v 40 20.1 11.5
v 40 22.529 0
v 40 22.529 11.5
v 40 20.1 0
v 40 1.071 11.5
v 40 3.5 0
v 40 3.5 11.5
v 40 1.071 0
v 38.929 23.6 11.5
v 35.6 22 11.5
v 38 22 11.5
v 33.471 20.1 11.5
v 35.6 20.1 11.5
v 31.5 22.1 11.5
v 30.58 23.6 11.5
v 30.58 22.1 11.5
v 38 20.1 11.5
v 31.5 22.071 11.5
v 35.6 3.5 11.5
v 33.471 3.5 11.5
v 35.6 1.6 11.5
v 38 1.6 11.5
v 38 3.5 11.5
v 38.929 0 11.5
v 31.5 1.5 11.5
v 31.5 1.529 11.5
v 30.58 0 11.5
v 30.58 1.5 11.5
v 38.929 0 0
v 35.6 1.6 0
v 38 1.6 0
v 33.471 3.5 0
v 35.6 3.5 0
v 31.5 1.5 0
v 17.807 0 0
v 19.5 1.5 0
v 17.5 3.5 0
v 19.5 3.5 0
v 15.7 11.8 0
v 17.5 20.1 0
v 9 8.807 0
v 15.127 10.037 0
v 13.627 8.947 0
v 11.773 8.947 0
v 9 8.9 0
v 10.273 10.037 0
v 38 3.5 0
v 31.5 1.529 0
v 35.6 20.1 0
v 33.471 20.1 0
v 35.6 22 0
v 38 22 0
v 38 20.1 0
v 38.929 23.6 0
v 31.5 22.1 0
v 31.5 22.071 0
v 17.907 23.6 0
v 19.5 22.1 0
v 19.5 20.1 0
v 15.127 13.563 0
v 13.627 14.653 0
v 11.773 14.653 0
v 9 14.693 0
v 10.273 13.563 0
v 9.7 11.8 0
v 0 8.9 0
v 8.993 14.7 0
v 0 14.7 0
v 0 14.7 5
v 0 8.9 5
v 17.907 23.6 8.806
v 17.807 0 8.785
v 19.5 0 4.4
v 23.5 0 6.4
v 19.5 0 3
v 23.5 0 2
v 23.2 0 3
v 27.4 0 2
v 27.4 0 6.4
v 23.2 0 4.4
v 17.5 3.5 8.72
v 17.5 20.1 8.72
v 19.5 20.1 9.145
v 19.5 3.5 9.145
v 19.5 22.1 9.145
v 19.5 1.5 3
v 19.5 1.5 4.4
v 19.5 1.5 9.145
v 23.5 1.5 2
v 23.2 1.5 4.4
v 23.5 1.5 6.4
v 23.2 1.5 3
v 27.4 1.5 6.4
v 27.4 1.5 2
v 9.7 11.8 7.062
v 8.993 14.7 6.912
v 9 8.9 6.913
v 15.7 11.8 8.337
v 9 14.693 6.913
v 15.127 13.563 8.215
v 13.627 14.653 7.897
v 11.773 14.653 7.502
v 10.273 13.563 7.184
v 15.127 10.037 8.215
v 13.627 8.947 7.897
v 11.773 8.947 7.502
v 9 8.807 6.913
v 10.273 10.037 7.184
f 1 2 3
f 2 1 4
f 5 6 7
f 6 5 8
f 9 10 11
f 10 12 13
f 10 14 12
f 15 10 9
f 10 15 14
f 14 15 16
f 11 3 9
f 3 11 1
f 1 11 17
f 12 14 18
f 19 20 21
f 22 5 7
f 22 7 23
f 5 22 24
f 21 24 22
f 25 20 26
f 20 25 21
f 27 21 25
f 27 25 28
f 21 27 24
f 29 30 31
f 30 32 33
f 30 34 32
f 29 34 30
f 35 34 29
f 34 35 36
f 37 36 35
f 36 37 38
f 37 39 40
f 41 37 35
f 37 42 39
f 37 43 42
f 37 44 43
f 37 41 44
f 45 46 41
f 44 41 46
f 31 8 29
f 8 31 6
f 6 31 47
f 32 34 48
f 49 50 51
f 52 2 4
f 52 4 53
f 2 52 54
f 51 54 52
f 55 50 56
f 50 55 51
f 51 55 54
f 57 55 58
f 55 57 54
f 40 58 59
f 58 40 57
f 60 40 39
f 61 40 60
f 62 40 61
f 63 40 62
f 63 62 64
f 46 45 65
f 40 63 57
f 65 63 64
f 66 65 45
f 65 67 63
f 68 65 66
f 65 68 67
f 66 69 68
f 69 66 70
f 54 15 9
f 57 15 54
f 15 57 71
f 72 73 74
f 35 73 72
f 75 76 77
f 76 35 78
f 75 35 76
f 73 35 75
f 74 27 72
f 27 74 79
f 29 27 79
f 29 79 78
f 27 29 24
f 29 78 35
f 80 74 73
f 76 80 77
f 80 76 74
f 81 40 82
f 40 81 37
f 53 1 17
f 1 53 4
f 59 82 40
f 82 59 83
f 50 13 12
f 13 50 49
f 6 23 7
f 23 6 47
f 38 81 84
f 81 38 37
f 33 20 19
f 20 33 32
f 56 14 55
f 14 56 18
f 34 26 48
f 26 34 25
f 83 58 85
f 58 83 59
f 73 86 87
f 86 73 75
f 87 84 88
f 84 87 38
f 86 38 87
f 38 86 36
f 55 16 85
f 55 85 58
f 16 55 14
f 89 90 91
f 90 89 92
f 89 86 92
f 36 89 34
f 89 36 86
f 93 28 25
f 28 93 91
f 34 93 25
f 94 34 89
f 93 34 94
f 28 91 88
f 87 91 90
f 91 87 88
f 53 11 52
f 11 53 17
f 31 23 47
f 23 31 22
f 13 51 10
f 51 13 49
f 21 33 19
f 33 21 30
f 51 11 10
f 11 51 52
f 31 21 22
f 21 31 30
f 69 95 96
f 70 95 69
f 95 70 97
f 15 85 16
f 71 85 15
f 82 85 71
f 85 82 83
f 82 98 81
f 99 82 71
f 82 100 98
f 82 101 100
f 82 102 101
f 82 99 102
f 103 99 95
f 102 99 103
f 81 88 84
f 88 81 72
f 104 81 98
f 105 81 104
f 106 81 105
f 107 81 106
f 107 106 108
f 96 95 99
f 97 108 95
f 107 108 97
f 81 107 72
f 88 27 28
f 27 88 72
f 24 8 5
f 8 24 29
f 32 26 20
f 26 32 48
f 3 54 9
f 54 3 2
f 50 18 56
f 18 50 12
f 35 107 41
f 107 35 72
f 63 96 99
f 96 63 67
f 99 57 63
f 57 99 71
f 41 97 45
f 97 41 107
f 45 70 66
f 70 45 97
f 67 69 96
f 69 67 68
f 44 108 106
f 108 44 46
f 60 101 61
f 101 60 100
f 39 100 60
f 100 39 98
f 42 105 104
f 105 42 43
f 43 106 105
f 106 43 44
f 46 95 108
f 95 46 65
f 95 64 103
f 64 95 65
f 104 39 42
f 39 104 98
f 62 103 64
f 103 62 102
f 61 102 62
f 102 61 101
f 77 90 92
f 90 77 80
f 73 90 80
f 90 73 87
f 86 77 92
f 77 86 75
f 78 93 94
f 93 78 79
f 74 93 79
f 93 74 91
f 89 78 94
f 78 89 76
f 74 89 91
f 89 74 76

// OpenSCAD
use <MCAD/involute_gears.scad>

module cutout() {
	difference() {
		rotate([45,0,0]) cube([33,9,9]);
		translate([-0.5,-6,11]) cube([34,10,10]);
		translate([-0.5,6.3,0]) cube([34,10,10]);
		translate([-0.5,-16.3,0]) cube([34,10,10]);
	}
}

module cageUp(withServo) {
	difference() {
		union() {
			translate([-12.5,-8,0]) cube([25,16,17.2]);
			difference() {
				translate([-16.1,-8,10]) cube([32.2,16,7.2]);
				translate([11,-8.25,11]) rotate([0,45,0]) cube([30, 16.5, 30]);		
				translate([-11,-8.25,11]) rotate([0,-135,0]) cube([10, 16.5, 10]);
			}
		}
		translate([-11.75,-6.3,1]) cube([23.5,12.6,16.3]);
		translate([-13,-6.3,3]) cube([26,12.6,7]);
		translate([-16.5,0,3.65]) cutout();
		translate([-10,-8.1,1]) cube([20,16.2,10]);
		translate([-5,-8.1,1]) cube([10,16.2,14.7]);
		translate([-3.7,-10,4.65]) rotate([0, 0, 90]) cutout();
		translate([3.7,-10,4.65]) rotate([0, 0, 90]) cutout();
		translate([13.75,0,14.3]) cylinder(r=1,h=3,$fn=45);
		translate([-13.75,0,14.3]) cylinder(r=1,h=3,$fn=45);
	}
	if (withServo) {
		translate([11.5,6.3,1]) rotate([0,0,180]) servo();
	}
}

module cageSide(withServo, mount) {
	difference() {
		rotate([-90,0,0]) union() {
			translate([-13.5,-8,0]) cube([27,16,17.2]);
			translate([-16.1,-8,12.2]) cube([32.2,16,5]);
		}
		rotate([-90,0,0]) translate([-11.75,-6.3,1]) cube([23.5,12.6,16.3]);
		rotate([-90,0,0]) translate([11,-12,3.5]) cube([3,15,4]);
		rotate([-90,0,0]) translate([13.75,0,10.3]) cylinder(r=1,h=8,$fn=45);
		rotate([-90,0,0]) translate([-13.75,0,10.3]) cylinder(r=1,h=8,$fn=45);
		rotate([-90,0,0]) translate([-11.75,-10,1]) cube([23.5,12.6,16.3]);
	}
	if (mount) {
		translate([5.5, 0, 0]) rotate([90, 0, 0]) union() {
			cylinder(r=6.2, h=0.5, $fn=45);
			difference() {
				cylinder(r=5, h=3.5, $fn=45);
				translate([0,0,-0.05]) cylinder(r=1.1, h=4, $fn=45);
			}
		}
		color("Green") rotate([-90,0,0]) translate([5.3, 4.95, -3.5]) cube([0.4, 5, 2.5]);
	}
	if (withServo) {
		translate([11.8,1,-6.3]) rotate([90,0,180]) servo();
	}
}

module footBar(length,width,height) {
	translate([-length/2,-width/2,0]) cube([length,width,height]);
	translate([-length/2,0,0]) cylinder(r=width/2,h=height,$fn=45);
	translate([length/2,0,0]) cylinder(r=width/2,h=height,$fn=45);
}

module foot(withServo) {
	footBar(100,10,3);
	rotate([0,0,90]) footBar(100,10,3);
	translate([-5.5,0,2]) cageUp(withServo);
	translate([-18,-8,0]) cube([25,16,3]);
}

module swing(withServo) {
	translate([-5.5,-12.5,12.9]) cageSide(withServo, true);
	difference() {
		union() {
			cylinder(r=20,h=5,$fn=45);
			translate([-45, 17.5, 2.5]) rotate([0, 90, 0]) cylinder(r=2.5, h=45, $fn=45);
			translate([-27, 17.4, 2.5]) rotate([60, 90, 0]) cylinder(r=2.5, h=20, $fn=45);
		}
		translate([0,0,-0.05]) cylinder(r=3,h=5.1,$fn=45);
		translate([0, -18, 5.1]) cube([30, 10, 2], center=true);
		translate([0, 18, 5.1]) cube([30, 10, 2], center=true);
	}
}

module armPart(ri) {
	difference() {
		union() {
			cube([20, 2, 16]);
			translate([0,0,8]) rotate([-90,0,0]) cylinder(r=8, h=2, $fn=45);
		}
		translate([0, -0.1, 8]) rotate([-90,0,0]) cylinder(r=ri, h=2.2, $fn=45);
	}
}

module rampPart(length) {
	difference() {
		cube([length, 8, 8]);
		translate([0,3,0]) rotate([30, 0, 0]) translate([-0.1, -8, 0]) cube([length+0.2,8,8]);
		translate([-0.1,5,0]) rotate([-30, 0, 0]) cube([length+0.2,8,8]);
		translate([-0.1,4,10]) rotate([0,90,0]) cylinder(r=5, h=length+0.2, $fn=45);
	}
}

module springHolder() {
	rampPart(20);
	translate([1.7,0,0.1]) rotate([0,-15,0]) translate([-5,0,0]) rampPart(5);
	translate([-1.5,0,-0.7]) rotate([0,-30,0]) translate([-5,0,0]) rampPart(5);
	translate([18,4,0]) cylinder(r=1, h=8, $fn=45);
	translate([18,4,4.5]) rotate([0,30,0]) cylinder(r=1, h=4, $fn=45);
	translate([18.5,4,7.5]) cylinder(r=1.5, h=1, $fn=45);
	translate([19.5,4,7.5]) cylinder(r=1.5, h=1, $fn=45);
	translate([18.5,2.5,7.5]) cube([1,3,1]);
}

module arm(withServo, spring) {
	translate([44,-12.5,8]) difference() {
		cageSide(withServo, true);
		translate([0,0,-13]) cube([40,40,10], center=true);
	}
	translate([0,-15,0]) armPart(5.2);
	translate([0,15.5,0]) armPart(3.6);
	translate([20, -15, 0]) rotate([0, 0, 45]) cube([6, 2, 16]);
	translate([22.5, -12.5, 0]) cube([8, 2, 16]);
	translate([20, 17.5, 0]) rotate([0, 0, -45]) translate([0, -2, 0]) cube([6.35, 2, 16]);
	translate([22.5, -12.5, 0]) cube([2, 25.5, 16]);
	translate([23, -0.3, 0]) cube([5, 5, 16]);
	translate([9, 17.4, 0]) cube([6,4.5,5]);
	translate([9, 19.9, 4.9]) cube([6,2,6.2]);
	translate([9, 17.4, 11]) cube([6,4.5,5]);
	if (spring) {
		translate([0,12.5,15.9]) springHolder();
	}
}

module armFront(withServo) {
	translate([28,0.5,8]) rotate([0,0,-90]) difference() {
		cageSide(withServo, false);
		translate([-20,15.3,-10]) cube([43,2,20]);
	}
	translate([0,-15,0]) armPart(5.2);
	translate([0,15.5,0]) armPart(3.6);
	translate([20, -15, 0]) rotate([0, 0, 45]) cube([6, 2, 16]);
	translate([21.5, -13, 0]) cube([7, 2, 16]);
	translate([22.5, 12, 0]) cube([6, 2, 16]);
	translate([20, 17.5, 0]) rotate([0, 0, -45]) translate([0, -2, 0]) cube([6.35, 2, 16]);
	translate([22.5, -13, 0]) cube([2, 27, 16]);
	translate([9, 17.4, 0]) cube([6,4.5,5]);
	translate([9, 19.9, 4.9]) cube([6,2,6.2]);
	translate([9, 17.4, 11]) cube([6,4.5,5]);
}

module frontPlate() {
	rotate([0,-90,0]) difference() {
		cube([2,43,20]);
		translate([-4,31.25,10]) rotate([0,90,0]) cylinder(r=1,h=8,$fn=45);
		translate([-4,3.75,10]) rotate([0,90,0]) cylinder(r=1,h=8,$fn=45);
		translate([-1,5.75,3.75]) cube([4,23.5,12.6]);
	}
}

module gripperGear(outerRadius,innerRadius) {
	outerteeth=10;
	pitch = outerRadius/outerteeth*360;
	echo("pitch: ", pitch);
	innerteeth=12;
	innerpitch = innerRadius/innerteeth*360;
	rotate([0,0,-4]) difference() {
		gear (number_of_teeth=outerteeth,
			pressure_angle=18,
			circular_pitch=pitch,
   	   gear_thickness = 3,
      	rim_thickness = 3,
	      hub_thickness = 3,
			bore_diameter = 1.5);
		translate([0,0,1]) 
			gear (number_of_teeth=innerteeth,
				pressure_angle=45,
				circular_pitch=innerpitch,
   		   gear_thickness = 2.5,
      		rim_thickness = 2.5,
	      	hub_thickness = 2.5,
				bore_diameter = 0);
	}
}

module gripper() {
	difference() {
		cube([40,23.6,11.5]);
		translate([17.5,3.5,-0.5]) cube([24,16.6,13]);
		translate([19.5,1.5,-0.5]) cube([12,20.6,13]);
		translate([35.6,1.6,-0.5]) cube([2.4, 20.4, 20]);
		translate([0,-0.1,5]) rotate([0,-12,0]) cube([38,24,11.5]);
		translate([46,0,0]) rotate([0,0,45]) translate([-5,-5,-0.1]) cube([10,10,12]);
		translate([31.5,8.6,0]) rotate([0,0,45]) translate([-5,-5,-0.1]) cube([10,10,12]);
		translate([46,23.6,0]) rotate([0,0,45]) translate([-5,-5,-0.1]) cube([10,10,12]);
		translate([31.5,15,0]) rotate([0,0,45]) translate([-5,-5,-0.1]) cube([10,10,12]);
		translate([9,-1.8,0]) rotate([0,0,45]) translate([-7.5,-7.5,-0.1]) cube([15,15,12]);
		translate([9,25.3,0]) rotate([0,0,45]) translate([-7.5,-7.5,-0.1]) cube([15,15,12]);
		translate([-0.1,-0.1,-0.1]) cube([9.1, 9, 12]);
		translate([-0.1,14.7,-0.1]) cube([9.1, 9, 12]);
		translate([12.7,11.8,-0.1]) cylinder(r=3,h=12);
		translate([19.5,-0.1,3]) cube([3.7,2.5,1.4]);
		translate([23.5,-0.1,2]) cube([3.9,2.5,4.4]);
	}

*%	translate([0,0,11.5]) rotate([-90,0,0]) scale([10,10,10]) import("Gripper_v5.stl");
}

module rackTooth() {
	difference() {
		translate([-0.5,0,0]) linear_exturde_flat_option(height=3.5) {
		involute_gear_tooth(5,5,5,6,7.5,10);
		}
		translate([-3.2,-3.2,-0.1]) cube([5,5,4]);
	}
}

module gripperRack() {
	cube([3.5,30,3.5]);
	for (i=[0:7]) {
		translate([0, 4 + 2.96*i, 0]) rackTooth();
	}
	translate([-2.45,4,0]) cube([2.5,1,3.5]);
	translate([-4.4,2.5,0]) cube([2,4,3.5]);
}

module servo() {
	color("LightBlue", 0.5) {
		cube([23.5,12.6,16.4]);
		translate([-4.65,0,16.3]) difference() {
			cube([32.8,12.6,2]);
			translate([2.65,6.3,-0.1]) cylinder(r=1,h=3,$fn=45);
			translate([32.8-2.65,6.3,-0.1]) cylinder(r=1,h=3,$fn=45);
		}
		translate([0,0,18.2]) cube([23.5,12.6,4.4]);
		translate([6.3,6.3,22.5]) cylinder(r=6.3,h=4.1,$fn=45);
		translate([6.3,6.3,26.5]) cylinder(r=2.25,h=2.8,$fn=45);
	}
}

module overview() {
	foot(true);
	translate([0,0,38]) swing(true);
	translate([0,0,43]) arm(true, true);
	translate([49.5,0,43]) arm(true, false);
	translate([99,0,43]) {
		armFront(true);
		translate([45,18,-2]) rotate([180,90,0]) frontPlate();
		translate([81,-15.5,20]) rotate([90,180,0]) gripper();
// gripperRack and gripperGear are commented because
// they slow down rendering considerably on my PC
*		translate([58,-22.5,18]) rotate([0,90,0]) gripperRack();
		translate([81,3.5,-3]) rotate([-90,180,0]) gripper();
*		translate([58,12.5,-1]) rotate([0,-90,180]) gripperRack();
*		translate([61,-5,8.5]) rotate([0,-90,0]) gripperGear(4.5,2.5);
	}
}

// print one foot
*foot(false);
// print one swing
//swing(false);
// print one arm with spring holder
//arm(false, true);
// print one arm without spring holder
//arm(false, false);
// print one armFront
//armFront(false);
// print one frontPlate
//frontPlate();
// print one gripperGear
*gripperGear(4.5,2.5);
// print two gripper
gripper();
// print two gripperRack
//gripperRack();

// shows the complete thing
//overview();
